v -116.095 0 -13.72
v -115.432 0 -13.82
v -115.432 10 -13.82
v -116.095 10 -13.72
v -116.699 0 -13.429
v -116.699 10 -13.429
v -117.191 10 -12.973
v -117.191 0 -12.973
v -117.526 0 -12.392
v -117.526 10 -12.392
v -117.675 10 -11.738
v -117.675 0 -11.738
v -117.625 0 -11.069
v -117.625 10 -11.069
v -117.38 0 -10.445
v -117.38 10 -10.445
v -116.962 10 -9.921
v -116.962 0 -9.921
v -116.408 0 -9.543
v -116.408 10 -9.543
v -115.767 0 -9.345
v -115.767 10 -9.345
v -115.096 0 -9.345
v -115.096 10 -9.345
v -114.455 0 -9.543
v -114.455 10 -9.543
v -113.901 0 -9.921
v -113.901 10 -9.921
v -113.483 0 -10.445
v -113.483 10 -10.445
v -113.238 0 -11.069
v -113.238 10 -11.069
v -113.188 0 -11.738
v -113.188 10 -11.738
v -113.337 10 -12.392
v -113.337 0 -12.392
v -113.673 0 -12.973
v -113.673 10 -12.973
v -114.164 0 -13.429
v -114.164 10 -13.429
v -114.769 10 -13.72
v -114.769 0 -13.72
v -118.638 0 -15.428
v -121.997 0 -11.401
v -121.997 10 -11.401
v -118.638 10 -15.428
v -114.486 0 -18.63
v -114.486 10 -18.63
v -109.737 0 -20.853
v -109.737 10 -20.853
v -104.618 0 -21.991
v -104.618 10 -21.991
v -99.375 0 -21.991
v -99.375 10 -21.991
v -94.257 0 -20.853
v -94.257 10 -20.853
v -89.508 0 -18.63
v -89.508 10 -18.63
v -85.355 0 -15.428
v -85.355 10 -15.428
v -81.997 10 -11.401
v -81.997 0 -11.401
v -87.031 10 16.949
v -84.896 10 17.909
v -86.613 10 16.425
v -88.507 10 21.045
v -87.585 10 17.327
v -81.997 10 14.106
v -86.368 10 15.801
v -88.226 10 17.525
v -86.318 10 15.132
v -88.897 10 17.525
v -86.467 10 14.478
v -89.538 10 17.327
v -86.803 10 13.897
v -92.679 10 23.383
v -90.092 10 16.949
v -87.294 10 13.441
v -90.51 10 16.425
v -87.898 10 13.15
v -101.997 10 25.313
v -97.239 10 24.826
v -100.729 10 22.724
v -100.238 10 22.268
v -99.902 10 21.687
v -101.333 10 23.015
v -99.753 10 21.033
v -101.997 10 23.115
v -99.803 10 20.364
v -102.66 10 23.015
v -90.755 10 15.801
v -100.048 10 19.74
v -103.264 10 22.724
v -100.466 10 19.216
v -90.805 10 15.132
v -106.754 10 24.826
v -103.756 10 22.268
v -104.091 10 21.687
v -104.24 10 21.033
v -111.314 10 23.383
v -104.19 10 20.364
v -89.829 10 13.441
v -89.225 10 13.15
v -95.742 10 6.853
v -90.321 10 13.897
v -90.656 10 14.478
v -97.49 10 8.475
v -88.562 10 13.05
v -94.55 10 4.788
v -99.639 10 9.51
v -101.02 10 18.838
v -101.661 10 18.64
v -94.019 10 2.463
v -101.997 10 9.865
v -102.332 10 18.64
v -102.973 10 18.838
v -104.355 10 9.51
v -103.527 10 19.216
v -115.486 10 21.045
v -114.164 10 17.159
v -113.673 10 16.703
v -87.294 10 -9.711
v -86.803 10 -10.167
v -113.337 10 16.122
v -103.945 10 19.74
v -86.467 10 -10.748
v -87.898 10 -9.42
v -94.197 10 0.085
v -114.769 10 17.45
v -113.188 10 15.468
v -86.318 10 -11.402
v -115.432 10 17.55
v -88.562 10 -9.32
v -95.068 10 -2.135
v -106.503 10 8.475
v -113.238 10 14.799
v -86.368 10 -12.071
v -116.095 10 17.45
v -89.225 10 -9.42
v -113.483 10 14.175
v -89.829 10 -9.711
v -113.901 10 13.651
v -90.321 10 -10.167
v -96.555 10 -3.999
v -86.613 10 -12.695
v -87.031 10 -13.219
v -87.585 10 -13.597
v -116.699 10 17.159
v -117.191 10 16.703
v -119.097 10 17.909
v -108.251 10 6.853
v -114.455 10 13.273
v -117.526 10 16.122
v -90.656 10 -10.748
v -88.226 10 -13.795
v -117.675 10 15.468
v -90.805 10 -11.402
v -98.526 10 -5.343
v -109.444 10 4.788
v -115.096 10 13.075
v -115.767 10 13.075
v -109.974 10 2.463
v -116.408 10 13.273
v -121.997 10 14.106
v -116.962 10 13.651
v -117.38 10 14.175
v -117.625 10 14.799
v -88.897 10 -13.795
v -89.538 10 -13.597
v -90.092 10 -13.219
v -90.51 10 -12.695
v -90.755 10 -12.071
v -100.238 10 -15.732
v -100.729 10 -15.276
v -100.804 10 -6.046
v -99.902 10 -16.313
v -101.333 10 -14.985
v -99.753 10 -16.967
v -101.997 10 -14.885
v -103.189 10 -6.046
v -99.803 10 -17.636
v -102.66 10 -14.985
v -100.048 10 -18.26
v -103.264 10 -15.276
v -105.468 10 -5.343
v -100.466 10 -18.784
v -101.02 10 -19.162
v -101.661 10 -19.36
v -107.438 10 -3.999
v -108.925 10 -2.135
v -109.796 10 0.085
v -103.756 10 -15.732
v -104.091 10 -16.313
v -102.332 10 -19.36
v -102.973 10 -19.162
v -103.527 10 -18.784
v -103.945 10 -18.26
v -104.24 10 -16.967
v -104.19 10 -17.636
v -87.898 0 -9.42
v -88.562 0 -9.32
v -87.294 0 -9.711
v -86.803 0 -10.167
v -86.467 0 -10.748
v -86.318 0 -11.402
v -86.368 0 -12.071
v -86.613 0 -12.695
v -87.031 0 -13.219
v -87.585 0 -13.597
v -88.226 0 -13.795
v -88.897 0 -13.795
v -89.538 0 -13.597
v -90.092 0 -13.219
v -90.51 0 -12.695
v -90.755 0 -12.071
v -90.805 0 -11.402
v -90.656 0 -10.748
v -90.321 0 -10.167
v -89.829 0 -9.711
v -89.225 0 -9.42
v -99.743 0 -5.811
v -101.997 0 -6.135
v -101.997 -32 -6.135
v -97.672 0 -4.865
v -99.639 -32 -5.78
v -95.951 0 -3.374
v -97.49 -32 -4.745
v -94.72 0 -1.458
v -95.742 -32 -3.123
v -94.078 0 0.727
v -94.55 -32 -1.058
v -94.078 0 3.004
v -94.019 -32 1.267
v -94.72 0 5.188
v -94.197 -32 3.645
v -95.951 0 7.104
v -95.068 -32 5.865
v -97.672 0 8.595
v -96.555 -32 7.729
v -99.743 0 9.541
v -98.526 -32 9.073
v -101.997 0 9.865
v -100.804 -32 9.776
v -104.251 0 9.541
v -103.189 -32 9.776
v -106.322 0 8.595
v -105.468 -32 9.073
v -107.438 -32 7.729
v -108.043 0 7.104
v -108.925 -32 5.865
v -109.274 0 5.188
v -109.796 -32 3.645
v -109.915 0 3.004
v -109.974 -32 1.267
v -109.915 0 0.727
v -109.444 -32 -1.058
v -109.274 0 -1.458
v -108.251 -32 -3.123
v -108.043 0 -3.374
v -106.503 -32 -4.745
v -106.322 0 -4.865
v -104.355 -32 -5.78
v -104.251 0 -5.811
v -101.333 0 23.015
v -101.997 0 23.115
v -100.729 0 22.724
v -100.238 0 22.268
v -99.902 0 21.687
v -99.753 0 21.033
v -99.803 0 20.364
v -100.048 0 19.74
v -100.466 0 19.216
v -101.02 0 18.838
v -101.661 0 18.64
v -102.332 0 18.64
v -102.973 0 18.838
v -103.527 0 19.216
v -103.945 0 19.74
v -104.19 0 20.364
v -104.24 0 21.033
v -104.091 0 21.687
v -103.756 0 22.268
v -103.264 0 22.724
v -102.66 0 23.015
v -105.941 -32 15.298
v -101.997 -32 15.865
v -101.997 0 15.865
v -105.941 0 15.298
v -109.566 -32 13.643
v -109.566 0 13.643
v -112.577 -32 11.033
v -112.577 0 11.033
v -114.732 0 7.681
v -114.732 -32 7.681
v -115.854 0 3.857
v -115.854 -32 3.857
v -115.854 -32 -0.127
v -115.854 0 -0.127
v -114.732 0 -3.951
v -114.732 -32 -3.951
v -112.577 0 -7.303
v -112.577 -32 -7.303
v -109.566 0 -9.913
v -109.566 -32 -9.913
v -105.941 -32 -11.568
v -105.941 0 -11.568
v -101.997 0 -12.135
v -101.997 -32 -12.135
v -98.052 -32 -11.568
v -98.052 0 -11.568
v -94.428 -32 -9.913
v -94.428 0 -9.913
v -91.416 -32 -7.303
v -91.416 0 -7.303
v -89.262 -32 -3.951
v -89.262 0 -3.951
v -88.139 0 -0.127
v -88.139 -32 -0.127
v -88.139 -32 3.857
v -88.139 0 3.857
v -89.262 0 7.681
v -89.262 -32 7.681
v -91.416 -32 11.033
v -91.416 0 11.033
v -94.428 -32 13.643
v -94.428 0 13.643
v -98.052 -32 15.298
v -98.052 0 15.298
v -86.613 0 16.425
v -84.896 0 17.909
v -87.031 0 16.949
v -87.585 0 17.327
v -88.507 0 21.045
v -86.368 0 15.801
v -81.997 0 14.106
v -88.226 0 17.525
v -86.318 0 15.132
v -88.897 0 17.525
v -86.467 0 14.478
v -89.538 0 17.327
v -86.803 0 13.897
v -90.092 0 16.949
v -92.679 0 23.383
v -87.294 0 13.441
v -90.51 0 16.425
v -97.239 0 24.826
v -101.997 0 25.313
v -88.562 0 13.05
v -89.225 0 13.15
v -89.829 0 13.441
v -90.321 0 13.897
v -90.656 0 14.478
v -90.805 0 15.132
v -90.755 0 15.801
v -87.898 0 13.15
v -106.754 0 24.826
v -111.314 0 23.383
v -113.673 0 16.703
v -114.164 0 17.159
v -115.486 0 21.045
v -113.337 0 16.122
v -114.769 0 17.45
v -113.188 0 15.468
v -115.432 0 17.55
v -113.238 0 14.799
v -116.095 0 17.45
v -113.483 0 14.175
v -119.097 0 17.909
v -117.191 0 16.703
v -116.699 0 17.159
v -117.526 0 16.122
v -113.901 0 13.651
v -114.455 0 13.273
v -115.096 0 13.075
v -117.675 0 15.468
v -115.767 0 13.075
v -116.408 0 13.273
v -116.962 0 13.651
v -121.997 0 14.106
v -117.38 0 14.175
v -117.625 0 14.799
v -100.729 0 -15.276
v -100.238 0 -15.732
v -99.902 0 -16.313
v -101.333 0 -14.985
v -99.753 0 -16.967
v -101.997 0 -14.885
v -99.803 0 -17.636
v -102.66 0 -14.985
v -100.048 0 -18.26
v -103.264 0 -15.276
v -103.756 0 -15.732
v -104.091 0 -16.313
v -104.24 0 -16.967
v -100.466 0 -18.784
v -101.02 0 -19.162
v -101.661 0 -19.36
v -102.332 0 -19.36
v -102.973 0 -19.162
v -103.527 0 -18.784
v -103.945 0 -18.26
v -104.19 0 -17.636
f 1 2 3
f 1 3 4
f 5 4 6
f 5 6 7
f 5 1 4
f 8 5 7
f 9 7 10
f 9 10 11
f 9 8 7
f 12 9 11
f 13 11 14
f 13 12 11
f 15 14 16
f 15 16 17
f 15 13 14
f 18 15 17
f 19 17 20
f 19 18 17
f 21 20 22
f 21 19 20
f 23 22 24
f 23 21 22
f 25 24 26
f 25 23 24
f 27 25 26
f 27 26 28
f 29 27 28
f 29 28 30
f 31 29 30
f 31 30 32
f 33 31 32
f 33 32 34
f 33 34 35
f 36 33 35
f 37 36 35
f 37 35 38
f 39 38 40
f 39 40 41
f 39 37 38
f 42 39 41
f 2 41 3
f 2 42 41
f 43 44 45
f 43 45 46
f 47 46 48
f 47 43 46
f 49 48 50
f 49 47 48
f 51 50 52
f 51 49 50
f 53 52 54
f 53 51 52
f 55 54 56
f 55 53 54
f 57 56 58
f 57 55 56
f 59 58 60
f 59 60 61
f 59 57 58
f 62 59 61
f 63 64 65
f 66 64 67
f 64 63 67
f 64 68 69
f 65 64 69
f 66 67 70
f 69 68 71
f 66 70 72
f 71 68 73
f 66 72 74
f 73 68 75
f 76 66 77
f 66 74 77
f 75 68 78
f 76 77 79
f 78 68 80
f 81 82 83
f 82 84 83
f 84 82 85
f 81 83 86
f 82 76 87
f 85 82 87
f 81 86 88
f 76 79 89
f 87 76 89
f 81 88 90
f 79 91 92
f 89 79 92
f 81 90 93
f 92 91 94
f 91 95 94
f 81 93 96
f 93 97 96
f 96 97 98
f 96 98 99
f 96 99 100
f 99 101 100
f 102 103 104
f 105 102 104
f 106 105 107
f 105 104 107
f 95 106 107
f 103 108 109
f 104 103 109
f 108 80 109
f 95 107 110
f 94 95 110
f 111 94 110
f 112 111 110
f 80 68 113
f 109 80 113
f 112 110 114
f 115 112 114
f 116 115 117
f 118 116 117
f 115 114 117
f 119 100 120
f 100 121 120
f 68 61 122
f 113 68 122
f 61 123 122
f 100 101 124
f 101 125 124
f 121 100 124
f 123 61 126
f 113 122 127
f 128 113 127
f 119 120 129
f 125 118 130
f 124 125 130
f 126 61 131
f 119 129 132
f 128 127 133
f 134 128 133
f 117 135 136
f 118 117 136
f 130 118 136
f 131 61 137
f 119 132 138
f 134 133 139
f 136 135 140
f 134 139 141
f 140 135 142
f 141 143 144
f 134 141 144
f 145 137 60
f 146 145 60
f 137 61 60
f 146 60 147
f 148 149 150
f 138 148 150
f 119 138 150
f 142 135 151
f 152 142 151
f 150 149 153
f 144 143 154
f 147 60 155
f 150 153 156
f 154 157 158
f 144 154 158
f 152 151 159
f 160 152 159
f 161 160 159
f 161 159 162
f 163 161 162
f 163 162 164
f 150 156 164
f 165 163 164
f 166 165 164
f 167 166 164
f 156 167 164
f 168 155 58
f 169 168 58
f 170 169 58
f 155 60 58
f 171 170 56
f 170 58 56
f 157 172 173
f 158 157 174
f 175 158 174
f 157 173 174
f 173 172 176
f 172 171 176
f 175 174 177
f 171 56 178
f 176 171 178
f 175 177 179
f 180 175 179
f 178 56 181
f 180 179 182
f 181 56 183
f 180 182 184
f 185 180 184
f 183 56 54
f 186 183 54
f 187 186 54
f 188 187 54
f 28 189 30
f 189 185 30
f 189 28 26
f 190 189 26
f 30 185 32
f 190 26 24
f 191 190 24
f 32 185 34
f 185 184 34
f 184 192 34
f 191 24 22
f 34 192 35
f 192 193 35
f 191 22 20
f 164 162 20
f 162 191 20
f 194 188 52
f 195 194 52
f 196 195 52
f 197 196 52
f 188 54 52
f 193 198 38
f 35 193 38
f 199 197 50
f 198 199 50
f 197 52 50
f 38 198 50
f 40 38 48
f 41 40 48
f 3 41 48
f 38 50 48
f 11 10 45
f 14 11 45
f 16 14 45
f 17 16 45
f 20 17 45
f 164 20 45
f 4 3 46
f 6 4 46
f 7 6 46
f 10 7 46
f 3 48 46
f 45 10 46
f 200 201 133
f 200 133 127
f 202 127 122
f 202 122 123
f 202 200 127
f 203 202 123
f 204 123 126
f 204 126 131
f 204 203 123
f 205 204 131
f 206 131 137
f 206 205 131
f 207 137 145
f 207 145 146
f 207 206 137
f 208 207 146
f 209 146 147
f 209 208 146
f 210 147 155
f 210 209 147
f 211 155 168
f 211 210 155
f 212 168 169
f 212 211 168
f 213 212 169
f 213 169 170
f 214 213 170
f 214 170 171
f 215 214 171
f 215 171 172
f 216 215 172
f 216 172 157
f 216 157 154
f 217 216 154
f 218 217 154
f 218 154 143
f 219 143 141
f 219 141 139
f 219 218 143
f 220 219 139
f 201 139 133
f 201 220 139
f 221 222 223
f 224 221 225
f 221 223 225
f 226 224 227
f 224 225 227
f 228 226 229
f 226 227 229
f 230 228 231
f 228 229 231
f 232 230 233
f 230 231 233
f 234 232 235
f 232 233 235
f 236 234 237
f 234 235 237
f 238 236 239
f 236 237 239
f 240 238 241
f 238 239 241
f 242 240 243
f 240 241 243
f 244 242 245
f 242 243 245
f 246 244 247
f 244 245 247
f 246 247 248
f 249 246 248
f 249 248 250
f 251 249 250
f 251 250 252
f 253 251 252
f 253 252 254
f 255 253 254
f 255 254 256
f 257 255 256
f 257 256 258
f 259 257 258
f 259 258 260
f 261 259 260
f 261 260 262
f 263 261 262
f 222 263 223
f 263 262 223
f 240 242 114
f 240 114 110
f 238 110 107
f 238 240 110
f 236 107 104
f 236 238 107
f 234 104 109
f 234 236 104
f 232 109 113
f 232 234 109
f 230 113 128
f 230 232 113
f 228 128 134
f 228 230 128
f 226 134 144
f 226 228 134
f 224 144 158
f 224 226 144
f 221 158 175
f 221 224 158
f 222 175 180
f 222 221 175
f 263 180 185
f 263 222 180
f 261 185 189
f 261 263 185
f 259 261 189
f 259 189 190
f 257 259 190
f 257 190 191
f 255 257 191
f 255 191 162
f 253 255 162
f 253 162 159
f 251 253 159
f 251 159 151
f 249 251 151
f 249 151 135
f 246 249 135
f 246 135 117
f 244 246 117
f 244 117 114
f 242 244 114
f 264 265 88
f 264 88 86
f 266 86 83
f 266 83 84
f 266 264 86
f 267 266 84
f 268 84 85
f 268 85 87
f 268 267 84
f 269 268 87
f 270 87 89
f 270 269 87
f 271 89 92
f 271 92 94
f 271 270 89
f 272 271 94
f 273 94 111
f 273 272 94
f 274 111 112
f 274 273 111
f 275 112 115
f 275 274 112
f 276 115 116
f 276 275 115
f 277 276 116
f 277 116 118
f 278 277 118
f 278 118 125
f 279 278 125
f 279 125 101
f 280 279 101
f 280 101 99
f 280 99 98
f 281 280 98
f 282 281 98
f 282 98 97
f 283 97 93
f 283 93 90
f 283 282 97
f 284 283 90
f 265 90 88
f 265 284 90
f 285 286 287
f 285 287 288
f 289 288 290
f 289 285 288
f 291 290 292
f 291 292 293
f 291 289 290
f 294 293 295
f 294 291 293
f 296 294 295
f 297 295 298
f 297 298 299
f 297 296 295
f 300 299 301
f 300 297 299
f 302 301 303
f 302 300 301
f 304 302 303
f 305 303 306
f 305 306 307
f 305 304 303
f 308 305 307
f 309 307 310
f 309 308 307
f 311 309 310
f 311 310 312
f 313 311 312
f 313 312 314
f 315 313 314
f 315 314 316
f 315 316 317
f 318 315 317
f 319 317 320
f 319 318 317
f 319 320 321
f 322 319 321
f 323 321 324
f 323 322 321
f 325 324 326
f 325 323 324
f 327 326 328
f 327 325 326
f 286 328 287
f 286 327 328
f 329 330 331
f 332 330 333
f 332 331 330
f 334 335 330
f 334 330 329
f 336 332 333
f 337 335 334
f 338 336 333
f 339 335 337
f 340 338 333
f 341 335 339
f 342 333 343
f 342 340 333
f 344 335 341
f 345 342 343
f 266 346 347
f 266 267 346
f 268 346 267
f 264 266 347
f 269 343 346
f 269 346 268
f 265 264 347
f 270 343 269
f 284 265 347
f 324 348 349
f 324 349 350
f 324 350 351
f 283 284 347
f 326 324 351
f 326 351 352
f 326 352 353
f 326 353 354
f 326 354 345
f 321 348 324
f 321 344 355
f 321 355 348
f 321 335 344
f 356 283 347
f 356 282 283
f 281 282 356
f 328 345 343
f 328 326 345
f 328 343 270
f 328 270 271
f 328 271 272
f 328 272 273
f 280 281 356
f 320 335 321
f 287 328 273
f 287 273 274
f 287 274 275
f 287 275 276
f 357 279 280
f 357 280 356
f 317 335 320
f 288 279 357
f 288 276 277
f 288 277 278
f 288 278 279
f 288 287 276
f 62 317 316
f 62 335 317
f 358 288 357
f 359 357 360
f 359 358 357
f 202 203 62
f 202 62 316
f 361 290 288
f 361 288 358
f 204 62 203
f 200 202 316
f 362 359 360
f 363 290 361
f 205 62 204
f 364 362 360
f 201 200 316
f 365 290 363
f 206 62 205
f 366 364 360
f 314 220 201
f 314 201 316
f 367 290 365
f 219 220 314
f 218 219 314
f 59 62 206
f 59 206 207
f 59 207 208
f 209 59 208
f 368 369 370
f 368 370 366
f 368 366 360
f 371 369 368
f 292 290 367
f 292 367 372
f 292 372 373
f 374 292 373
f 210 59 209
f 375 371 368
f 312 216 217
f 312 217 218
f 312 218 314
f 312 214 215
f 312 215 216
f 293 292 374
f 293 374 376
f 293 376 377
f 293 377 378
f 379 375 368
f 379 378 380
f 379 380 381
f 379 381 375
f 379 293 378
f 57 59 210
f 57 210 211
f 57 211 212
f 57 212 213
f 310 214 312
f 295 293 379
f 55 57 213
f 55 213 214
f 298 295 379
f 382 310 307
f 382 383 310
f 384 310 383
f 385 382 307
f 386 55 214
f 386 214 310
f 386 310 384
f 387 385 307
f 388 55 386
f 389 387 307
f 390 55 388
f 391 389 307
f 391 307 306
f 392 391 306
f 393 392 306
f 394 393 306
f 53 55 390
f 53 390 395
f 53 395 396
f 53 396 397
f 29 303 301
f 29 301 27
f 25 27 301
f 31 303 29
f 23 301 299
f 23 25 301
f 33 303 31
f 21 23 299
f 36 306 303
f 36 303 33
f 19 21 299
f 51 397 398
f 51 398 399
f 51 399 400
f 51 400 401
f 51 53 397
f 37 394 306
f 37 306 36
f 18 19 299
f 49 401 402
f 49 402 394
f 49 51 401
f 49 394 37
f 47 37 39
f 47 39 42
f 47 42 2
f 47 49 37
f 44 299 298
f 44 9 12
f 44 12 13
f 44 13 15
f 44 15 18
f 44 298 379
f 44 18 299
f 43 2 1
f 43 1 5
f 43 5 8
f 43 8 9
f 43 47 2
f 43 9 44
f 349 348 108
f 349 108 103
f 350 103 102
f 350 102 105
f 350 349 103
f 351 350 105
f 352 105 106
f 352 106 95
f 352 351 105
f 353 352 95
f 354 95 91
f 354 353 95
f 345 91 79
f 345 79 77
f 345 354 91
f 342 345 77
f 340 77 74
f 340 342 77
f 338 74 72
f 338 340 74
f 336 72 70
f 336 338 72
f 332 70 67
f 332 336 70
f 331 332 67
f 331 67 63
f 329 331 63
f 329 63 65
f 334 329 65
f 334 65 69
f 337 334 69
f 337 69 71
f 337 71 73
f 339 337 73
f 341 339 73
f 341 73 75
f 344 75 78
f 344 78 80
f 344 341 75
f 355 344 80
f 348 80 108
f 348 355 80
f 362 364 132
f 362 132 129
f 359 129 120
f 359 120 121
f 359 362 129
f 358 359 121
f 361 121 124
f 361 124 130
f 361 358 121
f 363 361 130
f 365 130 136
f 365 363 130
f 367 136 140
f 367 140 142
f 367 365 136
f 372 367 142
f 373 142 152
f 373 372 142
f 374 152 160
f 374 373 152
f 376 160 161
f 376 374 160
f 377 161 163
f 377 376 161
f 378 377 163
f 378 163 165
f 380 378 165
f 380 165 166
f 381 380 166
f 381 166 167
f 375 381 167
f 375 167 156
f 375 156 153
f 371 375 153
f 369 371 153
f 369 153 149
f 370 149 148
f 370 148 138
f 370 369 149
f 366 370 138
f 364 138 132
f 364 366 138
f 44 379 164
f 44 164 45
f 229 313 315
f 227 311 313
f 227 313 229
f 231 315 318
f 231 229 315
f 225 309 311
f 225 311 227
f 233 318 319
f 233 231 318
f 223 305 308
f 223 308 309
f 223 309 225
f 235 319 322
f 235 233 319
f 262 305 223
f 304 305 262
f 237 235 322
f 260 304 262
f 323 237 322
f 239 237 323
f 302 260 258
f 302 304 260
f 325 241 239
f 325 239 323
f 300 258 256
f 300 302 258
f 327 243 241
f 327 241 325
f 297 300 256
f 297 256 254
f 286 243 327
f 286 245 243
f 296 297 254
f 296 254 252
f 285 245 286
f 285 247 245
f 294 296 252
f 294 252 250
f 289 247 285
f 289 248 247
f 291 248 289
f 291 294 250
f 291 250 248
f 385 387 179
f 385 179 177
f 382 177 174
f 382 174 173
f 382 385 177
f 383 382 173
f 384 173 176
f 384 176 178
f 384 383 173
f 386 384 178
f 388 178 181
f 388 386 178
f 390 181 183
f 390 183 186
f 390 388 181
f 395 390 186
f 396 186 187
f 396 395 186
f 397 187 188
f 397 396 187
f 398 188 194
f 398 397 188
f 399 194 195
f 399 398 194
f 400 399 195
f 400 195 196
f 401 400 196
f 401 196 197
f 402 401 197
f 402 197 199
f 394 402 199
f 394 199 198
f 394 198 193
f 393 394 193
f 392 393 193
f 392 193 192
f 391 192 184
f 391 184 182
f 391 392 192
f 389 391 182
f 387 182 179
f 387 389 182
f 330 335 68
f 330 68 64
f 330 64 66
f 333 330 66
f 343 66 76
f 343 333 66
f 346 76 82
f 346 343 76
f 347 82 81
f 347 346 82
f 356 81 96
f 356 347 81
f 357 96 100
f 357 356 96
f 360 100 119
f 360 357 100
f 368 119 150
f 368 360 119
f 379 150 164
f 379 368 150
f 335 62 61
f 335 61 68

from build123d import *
from build123d.topology import SkipClean

# Parameters (mm, degrees)
SKETCH1_R      = 8
SKETCH1_R_2    = 2.25
EXTRUDE1_DEPTH = 10
EXTRUDE2_START = 32
SKETCH2_R      = 14
SKETCH2_R_2    = 8
EXTRUDE2_DEPTH = 32


with BuildPart() as part:
    # Sketch1 → Extrude1 (new body)
    with BuildSketch(Plane(origin=(0, 0, 0), x_dir=(1, 0, 0), z_dir=(0, 1, 0))):
        with BuildLine():
            Line((-81.996680828, 11.401457333), (-81.996680828, -14.105536597))
            ThreePointArc((-81.996680828, -14.105536597), (-101.996680828, -25.313489798), (-121.996680828, -14.105536597))
            Line((-121.996680828, -14.105536597), (-121.996680828, 11.401457333))
            ThreePointArc((-121.996680828, 11.401457333), (-101.996680828, 22.134958172), (-81.996680828, 11.401457333))
        make_face()
        with Locations(Location((-101.996680828, -1.865041828, 0), (0, 0, 270))):
            Circle(SKETCH1_R, mode=Mode.SUBTRACT)
        with Locations(Location((-101.996680828, 17.134958172, 0), (0, 0, 270))):
            Circle(SKETCH1_R_2, mode=Mode.SUBTRACT)
        with Locations(Location((-88.561651985, 11.569987015, 0), (0, 0, 270))):
            Circle(SKETCH1_R_2, mode=Mode.SUBTRACT)
        with Locations(Location((-115.43170967, 11.569987015, 0), (0, 0, 90))):
            Circle(SKETCH1_R_2, mode=Mode.SUBTRACT)
        with Locations(Location((-101.996680828, -20.865041828, 0), (0, 0, 270))):
            Circle(SKETCH1_R_2, mode=Mode.SUBTRACT)
        with Locations(Location((-88.561651985, -15.30007067, 0), (0, 0, 90))):
            Circle(SKETCH1_R_2, mode=Mode.SUBTRACT)
        with Locations(Location((-115.43170967, -15.30007067, 0), (0, 0, 270))):
            Circle(SKETCH1_R_2, mode=Mode.SUBTRACT)
    extrude(amount=EXTRUDE1_DEPTH)

    # Sketch2 → Extrude2 (add)
    with SkipClean():  # the faces are left unmerged after this step: merging them gives an invalid solid
        with BuildSketch(Plane.XZ.offset(EXTRUDE2_START)):
            with Locations(Location((-101.996680828, 1.865041828, 0), (0, 0, 90))):
                Circle(SKETCH2_R)
            with Locations(Location((-101.996680828, 1.865041828, 0), (0, 0, 270))):
                Circle(SKETCH2_R_2, mode=Mode.SUBTRACT)
        extrude(amount=-EXTRUDE2_DEPTH)


solid = part.part
